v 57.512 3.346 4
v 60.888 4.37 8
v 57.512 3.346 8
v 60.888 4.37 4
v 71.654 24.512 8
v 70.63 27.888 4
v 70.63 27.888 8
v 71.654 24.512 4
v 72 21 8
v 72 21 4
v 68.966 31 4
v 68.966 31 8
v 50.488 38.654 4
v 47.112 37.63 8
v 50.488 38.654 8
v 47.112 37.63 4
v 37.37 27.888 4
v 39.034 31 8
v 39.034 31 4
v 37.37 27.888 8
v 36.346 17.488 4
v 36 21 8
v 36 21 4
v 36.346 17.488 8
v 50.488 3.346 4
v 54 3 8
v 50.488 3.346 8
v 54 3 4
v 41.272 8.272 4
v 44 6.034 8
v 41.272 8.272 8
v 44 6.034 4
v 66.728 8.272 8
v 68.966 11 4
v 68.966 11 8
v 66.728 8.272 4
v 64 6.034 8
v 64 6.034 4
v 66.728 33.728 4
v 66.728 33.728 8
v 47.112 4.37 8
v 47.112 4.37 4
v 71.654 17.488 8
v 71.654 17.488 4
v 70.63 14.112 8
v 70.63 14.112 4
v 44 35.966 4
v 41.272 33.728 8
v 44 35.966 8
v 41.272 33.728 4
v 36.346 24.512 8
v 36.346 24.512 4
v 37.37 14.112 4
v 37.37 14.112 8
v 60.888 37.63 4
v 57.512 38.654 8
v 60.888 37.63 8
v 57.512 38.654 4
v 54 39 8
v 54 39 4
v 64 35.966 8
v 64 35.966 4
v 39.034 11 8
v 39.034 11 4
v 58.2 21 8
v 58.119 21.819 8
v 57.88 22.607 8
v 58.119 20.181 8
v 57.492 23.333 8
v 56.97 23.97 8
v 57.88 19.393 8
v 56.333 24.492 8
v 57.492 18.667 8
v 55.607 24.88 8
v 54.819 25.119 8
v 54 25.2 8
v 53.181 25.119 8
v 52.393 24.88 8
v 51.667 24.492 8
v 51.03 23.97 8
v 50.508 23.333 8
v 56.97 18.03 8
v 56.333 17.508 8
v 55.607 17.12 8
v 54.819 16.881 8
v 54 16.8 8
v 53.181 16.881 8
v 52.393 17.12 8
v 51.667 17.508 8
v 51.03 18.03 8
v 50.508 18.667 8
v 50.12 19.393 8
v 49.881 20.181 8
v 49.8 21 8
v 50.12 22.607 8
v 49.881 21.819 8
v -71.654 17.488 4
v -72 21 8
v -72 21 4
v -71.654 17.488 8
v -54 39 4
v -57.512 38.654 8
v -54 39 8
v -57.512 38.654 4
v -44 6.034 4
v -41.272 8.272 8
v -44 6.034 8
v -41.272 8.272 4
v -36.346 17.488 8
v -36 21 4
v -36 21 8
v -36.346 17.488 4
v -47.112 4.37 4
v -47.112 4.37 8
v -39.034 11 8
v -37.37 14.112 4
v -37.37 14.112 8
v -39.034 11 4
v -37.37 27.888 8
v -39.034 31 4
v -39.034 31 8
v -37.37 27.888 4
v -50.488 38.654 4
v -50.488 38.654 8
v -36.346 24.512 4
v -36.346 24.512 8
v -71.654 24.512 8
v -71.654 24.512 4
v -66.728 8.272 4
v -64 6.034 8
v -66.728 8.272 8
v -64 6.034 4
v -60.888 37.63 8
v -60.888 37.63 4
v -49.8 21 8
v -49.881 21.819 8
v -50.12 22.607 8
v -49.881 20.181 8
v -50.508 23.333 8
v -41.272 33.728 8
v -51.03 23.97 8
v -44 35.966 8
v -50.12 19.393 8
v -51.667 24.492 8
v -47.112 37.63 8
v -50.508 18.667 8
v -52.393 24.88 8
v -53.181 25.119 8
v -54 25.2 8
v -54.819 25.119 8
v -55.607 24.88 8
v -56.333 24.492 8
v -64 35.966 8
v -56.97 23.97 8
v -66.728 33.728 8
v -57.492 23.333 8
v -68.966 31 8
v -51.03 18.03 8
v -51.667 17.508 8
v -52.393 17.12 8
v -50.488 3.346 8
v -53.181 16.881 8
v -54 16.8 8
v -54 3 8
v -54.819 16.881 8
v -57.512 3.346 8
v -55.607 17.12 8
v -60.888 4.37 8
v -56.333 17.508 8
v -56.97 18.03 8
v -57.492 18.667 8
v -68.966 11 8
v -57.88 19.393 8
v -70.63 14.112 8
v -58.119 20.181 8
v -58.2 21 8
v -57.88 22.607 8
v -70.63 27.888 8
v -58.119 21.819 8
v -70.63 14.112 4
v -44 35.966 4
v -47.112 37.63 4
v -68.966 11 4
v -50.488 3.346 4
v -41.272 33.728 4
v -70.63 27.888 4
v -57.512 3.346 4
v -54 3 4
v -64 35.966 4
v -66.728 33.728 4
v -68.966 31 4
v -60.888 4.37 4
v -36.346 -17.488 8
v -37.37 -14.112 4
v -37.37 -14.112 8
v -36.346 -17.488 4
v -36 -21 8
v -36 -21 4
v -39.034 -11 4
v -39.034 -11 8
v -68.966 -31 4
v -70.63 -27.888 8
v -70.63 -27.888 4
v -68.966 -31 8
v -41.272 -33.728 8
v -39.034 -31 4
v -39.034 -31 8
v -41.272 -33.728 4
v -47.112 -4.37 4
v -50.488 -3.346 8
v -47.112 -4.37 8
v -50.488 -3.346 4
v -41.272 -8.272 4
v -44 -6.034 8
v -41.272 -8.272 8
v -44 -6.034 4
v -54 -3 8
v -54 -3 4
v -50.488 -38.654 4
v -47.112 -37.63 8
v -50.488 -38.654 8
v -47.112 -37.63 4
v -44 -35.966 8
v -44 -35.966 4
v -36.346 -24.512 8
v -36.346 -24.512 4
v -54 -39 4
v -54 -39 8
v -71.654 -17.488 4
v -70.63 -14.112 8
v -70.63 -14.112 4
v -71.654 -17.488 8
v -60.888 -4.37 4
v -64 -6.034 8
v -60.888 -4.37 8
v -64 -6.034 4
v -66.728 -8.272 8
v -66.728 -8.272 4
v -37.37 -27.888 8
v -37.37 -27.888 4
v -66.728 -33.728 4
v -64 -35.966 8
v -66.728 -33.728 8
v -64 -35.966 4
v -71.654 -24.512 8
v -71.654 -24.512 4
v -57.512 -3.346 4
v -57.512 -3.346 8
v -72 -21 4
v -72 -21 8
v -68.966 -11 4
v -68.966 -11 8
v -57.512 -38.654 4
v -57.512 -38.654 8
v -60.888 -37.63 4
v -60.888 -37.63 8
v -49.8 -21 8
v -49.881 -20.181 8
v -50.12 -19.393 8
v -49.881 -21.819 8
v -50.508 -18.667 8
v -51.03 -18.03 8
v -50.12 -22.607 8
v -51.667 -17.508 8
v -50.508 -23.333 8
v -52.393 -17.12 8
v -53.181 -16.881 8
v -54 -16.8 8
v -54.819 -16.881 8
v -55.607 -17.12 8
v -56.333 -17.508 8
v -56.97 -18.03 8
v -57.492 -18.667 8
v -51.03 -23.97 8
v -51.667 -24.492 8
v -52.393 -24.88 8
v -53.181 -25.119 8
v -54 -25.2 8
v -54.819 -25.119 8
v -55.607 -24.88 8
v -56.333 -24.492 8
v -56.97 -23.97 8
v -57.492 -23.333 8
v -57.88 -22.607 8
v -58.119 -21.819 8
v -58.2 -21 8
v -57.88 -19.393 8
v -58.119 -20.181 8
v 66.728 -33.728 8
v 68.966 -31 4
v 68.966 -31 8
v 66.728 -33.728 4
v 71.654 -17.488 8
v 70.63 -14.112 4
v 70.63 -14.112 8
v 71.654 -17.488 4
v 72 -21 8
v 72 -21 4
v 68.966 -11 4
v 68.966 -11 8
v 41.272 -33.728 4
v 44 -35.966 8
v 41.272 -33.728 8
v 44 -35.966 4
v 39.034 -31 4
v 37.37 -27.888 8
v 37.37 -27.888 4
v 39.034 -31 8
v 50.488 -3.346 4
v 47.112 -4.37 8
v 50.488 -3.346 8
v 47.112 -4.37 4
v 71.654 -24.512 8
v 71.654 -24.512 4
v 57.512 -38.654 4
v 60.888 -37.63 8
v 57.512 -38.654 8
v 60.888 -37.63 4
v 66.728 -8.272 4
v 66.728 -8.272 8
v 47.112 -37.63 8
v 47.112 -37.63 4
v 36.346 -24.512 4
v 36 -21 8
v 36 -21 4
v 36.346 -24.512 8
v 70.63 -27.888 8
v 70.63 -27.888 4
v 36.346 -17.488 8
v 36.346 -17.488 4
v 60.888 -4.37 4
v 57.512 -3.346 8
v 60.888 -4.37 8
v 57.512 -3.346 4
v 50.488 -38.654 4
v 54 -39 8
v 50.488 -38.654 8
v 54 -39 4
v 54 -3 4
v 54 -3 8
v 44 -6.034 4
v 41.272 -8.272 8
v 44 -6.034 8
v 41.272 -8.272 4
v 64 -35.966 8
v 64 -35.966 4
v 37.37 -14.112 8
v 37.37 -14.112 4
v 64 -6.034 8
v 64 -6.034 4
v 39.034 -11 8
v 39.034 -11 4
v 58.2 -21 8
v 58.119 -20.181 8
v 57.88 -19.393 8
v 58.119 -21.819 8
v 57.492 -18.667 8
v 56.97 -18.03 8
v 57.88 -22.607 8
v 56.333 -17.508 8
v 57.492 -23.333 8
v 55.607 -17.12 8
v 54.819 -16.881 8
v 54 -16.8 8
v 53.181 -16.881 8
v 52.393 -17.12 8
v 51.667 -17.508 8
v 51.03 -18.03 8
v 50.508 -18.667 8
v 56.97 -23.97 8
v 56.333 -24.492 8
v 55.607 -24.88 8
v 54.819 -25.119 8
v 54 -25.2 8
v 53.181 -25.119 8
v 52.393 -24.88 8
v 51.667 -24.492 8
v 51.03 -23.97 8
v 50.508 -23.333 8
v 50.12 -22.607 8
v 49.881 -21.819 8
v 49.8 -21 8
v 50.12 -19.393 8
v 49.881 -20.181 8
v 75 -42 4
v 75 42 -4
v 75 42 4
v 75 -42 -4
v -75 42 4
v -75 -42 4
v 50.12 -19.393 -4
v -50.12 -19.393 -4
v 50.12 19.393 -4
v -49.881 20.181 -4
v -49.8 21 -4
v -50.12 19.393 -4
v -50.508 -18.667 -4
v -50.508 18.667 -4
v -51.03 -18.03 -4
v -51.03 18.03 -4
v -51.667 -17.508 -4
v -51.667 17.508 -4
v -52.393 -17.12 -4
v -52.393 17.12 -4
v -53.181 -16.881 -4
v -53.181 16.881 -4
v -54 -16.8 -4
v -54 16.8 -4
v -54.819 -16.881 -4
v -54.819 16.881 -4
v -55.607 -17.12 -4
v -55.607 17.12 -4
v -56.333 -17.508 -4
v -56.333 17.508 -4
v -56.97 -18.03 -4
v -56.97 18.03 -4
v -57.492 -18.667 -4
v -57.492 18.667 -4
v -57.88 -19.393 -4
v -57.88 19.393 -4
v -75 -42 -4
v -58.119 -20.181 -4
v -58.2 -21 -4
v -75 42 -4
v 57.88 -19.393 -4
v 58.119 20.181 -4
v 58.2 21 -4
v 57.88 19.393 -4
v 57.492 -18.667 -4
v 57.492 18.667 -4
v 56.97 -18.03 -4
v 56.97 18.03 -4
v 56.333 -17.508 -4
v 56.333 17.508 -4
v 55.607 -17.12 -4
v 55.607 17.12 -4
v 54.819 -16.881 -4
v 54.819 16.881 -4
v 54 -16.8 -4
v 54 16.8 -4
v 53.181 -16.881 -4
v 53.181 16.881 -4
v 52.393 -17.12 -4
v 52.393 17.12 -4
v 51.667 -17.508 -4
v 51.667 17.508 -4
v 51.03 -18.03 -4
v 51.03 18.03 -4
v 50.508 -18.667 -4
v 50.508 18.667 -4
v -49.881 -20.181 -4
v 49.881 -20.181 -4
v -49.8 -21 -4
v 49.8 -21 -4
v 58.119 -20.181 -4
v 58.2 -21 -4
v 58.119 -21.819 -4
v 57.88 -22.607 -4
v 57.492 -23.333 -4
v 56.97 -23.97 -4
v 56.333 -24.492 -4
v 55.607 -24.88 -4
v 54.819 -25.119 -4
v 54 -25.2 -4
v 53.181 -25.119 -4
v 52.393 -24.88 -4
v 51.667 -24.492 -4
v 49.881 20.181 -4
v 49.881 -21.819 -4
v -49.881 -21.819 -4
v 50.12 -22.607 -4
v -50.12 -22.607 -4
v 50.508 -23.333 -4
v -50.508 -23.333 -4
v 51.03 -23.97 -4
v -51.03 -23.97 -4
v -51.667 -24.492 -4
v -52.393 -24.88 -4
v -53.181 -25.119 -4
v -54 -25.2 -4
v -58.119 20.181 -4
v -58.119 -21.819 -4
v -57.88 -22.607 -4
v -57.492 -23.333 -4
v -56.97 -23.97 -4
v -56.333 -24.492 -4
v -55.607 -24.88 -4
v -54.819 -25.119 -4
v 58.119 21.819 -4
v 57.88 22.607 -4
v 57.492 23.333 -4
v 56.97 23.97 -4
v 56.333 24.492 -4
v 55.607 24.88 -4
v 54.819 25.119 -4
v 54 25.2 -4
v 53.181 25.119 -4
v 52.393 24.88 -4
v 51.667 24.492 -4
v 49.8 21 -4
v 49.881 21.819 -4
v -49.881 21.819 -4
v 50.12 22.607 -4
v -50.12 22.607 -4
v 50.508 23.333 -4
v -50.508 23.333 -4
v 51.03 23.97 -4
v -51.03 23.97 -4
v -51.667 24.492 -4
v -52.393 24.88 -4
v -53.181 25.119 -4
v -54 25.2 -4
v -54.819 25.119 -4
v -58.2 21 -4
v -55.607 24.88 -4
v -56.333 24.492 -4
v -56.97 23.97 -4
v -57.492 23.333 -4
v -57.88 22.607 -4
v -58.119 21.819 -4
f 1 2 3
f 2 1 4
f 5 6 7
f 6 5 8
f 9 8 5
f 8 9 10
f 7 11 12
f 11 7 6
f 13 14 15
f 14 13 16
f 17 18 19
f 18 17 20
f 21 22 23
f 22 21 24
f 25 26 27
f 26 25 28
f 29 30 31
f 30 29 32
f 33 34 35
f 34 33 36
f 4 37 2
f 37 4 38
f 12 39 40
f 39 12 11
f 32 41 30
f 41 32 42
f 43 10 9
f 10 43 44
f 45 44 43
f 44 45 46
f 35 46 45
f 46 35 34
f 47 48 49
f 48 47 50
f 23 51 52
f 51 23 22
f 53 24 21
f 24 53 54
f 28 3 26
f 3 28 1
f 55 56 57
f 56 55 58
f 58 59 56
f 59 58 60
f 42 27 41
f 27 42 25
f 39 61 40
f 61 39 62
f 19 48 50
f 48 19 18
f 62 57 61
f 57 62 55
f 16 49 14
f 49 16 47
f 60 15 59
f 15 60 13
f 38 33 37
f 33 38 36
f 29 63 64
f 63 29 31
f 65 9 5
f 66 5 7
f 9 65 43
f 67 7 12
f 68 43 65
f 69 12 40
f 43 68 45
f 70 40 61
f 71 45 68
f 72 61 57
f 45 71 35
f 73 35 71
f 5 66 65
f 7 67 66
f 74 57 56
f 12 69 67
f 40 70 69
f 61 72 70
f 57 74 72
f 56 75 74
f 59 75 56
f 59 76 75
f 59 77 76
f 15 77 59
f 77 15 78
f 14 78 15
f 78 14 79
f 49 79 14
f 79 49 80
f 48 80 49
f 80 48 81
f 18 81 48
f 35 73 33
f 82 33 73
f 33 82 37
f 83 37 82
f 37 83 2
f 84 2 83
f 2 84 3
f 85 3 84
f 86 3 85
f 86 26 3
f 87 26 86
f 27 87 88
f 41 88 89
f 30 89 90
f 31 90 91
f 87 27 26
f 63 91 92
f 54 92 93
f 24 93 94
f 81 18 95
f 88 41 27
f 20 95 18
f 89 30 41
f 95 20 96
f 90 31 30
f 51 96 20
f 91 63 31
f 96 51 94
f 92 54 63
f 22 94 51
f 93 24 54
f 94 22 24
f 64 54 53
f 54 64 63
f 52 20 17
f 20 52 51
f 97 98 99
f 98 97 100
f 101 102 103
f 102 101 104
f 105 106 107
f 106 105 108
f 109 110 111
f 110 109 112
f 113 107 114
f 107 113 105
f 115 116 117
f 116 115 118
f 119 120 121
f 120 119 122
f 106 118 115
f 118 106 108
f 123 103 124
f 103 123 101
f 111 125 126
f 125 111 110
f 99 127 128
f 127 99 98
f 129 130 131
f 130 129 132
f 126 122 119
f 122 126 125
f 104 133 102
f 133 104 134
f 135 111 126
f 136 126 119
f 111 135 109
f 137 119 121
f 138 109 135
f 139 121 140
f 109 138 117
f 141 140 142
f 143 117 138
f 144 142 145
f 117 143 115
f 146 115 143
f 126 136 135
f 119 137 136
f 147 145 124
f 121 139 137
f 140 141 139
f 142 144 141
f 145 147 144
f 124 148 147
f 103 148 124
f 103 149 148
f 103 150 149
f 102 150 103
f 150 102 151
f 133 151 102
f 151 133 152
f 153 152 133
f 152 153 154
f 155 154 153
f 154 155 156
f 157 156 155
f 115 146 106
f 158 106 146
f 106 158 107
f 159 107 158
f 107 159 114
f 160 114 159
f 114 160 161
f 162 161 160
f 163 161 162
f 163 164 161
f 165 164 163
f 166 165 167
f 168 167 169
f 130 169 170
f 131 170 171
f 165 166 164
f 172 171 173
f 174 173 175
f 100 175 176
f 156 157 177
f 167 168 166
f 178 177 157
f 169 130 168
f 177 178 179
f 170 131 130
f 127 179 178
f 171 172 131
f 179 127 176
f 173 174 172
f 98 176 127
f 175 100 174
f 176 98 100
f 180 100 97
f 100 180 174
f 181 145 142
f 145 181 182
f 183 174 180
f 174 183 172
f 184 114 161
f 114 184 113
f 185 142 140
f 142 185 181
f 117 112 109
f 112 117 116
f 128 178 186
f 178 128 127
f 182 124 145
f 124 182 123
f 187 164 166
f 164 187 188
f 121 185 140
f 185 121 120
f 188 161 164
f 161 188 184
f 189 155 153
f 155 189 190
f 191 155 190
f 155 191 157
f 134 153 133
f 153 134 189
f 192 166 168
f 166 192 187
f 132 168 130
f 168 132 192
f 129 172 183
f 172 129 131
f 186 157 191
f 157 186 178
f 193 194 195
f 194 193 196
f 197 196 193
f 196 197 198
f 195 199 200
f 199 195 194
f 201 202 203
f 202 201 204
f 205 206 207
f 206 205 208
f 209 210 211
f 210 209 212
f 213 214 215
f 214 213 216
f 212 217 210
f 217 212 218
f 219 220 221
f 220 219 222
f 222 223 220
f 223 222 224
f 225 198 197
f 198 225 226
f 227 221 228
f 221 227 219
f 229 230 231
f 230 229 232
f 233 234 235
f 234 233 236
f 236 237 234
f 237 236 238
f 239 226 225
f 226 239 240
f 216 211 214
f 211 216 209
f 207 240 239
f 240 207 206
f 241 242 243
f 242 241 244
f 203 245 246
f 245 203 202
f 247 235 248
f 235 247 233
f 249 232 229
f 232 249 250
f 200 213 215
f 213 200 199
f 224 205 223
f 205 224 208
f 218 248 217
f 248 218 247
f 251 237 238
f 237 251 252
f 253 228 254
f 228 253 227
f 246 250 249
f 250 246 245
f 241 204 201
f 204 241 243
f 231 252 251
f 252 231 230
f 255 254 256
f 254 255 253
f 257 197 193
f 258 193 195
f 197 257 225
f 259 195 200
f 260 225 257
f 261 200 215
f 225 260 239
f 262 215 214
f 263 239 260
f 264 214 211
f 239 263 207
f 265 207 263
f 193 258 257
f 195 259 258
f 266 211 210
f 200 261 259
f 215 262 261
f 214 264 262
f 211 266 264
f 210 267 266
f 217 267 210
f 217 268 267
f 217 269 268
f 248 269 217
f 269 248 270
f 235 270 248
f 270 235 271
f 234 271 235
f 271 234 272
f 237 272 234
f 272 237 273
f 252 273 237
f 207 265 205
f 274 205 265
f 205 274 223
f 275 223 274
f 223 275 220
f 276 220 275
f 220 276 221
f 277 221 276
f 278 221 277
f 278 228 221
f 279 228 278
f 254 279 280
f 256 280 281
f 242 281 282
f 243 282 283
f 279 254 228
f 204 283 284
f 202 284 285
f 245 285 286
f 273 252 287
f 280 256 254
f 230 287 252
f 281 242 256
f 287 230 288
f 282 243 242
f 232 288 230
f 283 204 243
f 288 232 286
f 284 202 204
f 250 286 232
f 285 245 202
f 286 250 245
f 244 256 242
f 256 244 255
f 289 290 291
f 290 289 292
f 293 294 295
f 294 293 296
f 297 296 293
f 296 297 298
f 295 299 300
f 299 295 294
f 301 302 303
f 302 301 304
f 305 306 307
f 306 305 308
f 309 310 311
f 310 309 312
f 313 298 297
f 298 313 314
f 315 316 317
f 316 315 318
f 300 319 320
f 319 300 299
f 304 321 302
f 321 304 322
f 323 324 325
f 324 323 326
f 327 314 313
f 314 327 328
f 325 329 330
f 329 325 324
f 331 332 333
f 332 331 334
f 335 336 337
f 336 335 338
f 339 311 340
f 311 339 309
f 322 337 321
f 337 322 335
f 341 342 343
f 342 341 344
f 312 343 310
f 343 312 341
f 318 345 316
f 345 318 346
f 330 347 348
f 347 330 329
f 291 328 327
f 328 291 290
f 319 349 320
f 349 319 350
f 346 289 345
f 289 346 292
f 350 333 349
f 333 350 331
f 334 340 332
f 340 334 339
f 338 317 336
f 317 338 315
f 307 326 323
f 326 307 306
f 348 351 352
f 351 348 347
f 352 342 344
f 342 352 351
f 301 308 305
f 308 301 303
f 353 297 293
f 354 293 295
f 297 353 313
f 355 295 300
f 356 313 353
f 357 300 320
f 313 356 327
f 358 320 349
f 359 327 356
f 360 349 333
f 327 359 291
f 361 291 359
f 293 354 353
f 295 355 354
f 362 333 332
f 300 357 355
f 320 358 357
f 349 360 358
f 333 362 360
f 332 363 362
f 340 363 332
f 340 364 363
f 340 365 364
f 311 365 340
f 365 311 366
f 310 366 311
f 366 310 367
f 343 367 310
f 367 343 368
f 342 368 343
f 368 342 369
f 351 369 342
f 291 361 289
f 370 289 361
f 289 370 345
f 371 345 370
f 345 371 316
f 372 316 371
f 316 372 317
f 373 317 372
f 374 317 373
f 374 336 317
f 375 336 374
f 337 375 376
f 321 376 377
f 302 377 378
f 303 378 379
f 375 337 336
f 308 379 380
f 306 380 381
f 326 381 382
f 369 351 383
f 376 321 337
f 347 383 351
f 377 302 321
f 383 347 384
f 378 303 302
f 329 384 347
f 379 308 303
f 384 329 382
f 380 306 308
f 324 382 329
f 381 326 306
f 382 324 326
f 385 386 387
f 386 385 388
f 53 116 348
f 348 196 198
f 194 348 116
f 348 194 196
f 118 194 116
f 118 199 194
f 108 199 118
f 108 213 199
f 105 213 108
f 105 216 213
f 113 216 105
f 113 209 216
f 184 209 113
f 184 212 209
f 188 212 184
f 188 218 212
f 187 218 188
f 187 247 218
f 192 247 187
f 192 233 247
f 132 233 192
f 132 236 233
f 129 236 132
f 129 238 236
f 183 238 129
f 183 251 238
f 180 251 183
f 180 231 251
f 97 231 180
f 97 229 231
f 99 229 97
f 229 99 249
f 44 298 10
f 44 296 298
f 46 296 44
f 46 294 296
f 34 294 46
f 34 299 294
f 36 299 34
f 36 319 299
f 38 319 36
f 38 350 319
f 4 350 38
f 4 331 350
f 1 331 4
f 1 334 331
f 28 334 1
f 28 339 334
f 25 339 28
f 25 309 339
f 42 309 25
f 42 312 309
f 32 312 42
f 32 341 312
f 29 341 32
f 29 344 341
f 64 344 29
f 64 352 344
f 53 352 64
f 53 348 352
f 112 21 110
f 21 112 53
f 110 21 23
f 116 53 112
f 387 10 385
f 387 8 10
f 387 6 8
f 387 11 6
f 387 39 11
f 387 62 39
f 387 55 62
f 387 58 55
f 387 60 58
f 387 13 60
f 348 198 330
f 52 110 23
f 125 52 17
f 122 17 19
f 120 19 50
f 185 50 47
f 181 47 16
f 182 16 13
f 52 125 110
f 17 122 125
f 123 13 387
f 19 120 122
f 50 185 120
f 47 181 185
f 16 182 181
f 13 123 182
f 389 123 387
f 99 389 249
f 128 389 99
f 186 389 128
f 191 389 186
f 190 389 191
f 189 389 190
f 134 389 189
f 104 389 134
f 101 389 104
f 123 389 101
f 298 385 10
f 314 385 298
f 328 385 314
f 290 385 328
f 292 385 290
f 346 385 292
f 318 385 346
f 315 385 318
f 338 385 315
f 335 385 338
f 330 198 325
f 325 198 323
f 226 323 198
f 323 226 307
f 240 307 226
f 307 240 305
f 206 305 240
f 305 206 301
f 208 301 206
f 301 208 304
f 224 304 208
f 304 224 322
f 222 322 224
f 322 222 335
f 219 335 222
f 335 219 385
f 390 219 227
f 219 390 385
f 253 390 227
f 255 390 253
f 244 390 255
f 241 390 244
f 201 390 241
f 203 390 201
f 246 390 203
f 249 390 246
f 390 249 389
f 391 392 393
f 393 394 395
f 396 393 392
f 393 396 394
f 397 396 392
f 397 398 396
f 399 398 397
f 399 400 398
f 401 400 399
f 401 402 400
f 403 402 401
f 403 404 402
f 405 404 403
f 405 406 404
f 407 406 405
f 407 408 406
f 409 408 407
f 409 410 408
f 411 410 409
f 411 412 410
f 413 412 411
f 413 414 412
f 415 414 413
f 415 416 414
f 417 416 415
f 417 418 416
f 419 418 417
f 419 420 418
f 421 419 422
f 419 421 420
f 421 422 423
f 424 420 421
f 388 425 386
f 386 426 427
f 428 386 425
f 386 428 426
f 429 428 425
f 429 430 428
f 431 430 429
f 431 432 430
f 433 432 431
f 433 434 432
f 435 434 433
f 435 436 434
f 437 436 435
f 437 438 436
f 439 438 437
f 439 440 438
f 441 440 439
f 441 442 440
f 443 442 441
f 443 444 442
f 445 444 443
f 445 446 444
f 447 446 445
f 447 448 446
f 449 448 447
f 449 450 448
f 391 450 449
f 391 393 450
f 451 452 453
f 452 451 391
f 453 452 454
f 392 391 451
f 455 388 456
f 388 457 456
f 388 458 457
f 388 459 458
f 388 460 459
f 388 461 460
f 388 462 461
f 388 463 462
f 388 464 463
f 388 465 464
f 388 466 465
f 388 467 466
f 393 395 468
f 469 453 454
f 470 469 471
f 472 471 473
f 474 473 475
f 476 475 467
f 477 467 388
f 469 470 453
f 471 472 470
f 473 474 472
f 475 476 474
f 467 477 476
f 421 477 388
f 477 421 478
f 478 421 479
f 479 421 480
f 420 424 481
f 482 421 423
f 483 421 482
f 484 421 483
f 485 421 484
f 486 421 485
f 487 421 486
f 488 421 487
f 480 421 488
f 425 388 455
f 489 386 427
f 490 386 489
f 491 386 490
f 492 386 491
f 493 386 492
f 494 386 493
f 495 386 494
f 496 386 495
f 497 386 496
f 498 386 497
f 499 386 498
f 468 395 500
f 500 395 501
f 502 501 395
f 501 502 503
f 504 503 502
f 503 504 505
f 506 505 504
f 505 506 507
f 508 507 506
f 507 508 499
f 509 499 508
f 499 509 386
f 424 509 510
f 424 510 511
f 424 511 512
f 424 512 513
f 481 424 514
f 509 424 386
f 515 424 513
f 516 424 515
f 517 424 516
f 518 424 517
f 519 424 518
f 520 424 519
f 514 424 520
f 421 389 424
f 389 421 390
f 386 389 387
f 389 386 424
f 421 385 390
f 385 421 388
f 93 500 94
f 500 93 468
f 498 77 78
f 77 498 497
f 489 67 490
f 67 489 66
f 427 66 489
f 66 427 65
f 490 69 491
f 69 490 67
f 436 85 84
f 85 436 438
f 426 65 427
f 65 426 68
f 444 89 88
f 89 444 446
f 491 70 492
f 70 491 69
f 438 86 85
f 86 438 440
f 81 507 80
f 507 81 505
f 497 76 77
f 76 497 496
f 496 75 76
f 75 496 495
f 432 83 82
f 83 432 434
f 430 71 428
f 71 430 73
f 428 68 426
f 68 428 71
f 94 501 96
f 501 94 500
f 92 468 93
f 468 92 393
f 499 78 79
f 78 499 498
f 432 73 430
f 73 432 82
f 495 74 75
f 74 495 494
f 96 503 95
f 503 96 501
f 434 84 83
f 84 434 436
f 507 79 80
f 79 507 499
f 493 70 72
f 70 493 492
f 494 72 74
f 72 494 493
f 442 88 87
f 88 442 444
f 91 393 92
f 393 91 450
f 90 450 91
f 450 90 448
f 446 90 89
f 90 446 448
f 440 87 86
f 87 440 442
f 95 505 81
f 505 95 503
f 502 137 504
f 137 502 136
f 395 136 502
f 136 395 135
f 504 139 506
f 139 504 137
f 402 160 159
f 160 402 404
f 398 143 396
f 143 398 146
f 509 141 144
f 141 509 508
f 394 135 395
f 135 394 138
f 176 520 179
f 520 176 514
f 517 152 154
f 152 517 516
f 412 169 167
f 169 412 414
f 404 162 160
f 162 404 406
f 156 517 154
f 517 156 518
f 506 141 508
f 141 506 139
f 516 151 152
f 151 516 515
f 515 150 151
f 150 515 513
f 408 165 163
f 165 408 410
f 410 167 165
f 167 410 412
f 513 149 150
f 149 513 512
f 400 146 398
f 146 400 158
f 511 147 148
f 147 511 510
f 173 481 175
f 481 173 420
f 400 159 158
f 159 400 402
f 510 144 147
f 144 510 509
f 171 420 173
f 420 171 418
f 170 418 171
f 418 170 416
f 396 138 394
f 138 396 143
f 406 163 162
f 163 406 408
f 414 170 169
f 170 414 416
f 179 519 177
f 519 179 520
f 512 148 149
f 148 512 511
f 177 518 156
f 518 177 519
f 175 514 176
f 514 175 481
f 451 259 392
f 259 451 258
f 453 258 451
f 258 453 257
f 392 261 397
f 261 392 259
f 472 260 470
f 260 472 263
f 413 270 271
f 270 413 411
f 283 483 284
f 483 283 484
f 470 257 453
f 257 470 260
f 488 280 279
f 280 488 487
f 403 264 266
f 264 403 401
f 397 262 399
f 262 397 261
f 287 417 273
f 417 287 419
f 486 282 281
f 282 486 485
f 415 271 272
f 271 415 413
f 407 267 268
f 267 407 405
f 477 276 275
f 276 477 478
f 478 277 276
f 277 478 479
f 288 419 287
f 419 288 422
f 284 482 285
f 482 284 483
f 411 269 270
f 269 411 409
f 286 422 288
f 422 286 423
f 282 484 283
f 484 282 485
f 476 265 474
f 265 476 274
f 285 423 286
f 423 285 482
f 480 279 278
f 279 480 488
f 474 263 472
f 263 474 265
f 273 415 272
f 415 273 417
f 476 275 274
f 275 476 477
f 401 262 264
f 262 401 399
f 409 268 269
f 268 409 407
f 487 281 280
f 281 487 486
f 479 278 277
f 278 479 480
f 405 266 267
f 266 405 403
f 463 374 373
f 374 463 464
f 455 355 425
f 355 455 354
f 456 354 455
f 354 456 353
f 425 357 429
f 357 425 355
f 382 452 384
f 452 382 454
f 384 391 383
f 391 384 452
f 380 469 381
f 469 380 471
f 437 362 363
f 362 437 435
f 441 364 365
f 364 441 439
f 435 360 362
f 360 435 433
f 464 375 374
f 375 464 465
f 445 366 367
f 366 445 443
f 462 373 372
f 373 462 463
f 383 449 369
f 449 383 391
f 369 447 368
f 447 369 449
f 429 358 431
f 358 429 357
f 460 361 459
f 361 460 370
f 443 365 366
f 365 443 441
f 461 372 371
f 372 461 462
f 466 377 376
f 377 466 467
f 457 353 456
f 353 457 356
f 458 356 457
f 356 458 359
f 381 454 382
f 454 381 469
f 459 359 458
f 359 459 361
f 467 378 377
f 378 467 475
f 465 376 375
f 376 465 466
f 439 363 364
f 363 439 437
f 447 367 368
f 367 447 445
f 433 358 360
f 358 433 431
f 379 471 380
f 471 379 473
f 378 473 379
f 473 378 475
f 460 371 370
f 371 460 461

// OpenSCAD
$fn = 32;

// ----------------------------------------------------------------------
// Anchor pads 150 x 84 x 12
// four corner bosses with anchor holes
// ----------------------------------------------------------------------

// --- parameters (mm) ---
plate = [150, 84, 8];  // base plate size (x, y, z)
pads = 4;              // boss count, one per corner
edge = 21;             // boss centre offset from the plate edge
boss_d = 36;           // boss diameter
boss_h = 4;            // boss height above the base plate
hole_d = 8.4;          // hole diameter

// --- derived feature positions (mm) ---
height = plate[2] + boss_h;      // = 12   overall height of the part
corner_x = plate[0] / 2 - edge;  // = 54   boss centre X
corner_y = plate[1] / 2 - edge;  // = 21   boss centre Y
feature_centers = [
  [corner_x, corner_y],
  [-corner_x, corner_y],
  [-corner_x, -corner_y],
  [corner_x, -corner_y]
];   // boss centres, anchor holes are drilled there

// base plate, four bosses standing on it, anchor holes all the way through
difference() {
  union() {
    cube(plate, center = true);
    for (centre = feature_centers)
      translate([centre[0], centre[1], plate[2] / 2 - 1])
        cylinder(d = boss_d, h = boss_h + 1);
  }
  for (centre = feature_centers)
    translate([centre[0], centre[1], -height])
      cylinder(d = hole_d, h = 2 * height + 2);  // through boss and plate
}
